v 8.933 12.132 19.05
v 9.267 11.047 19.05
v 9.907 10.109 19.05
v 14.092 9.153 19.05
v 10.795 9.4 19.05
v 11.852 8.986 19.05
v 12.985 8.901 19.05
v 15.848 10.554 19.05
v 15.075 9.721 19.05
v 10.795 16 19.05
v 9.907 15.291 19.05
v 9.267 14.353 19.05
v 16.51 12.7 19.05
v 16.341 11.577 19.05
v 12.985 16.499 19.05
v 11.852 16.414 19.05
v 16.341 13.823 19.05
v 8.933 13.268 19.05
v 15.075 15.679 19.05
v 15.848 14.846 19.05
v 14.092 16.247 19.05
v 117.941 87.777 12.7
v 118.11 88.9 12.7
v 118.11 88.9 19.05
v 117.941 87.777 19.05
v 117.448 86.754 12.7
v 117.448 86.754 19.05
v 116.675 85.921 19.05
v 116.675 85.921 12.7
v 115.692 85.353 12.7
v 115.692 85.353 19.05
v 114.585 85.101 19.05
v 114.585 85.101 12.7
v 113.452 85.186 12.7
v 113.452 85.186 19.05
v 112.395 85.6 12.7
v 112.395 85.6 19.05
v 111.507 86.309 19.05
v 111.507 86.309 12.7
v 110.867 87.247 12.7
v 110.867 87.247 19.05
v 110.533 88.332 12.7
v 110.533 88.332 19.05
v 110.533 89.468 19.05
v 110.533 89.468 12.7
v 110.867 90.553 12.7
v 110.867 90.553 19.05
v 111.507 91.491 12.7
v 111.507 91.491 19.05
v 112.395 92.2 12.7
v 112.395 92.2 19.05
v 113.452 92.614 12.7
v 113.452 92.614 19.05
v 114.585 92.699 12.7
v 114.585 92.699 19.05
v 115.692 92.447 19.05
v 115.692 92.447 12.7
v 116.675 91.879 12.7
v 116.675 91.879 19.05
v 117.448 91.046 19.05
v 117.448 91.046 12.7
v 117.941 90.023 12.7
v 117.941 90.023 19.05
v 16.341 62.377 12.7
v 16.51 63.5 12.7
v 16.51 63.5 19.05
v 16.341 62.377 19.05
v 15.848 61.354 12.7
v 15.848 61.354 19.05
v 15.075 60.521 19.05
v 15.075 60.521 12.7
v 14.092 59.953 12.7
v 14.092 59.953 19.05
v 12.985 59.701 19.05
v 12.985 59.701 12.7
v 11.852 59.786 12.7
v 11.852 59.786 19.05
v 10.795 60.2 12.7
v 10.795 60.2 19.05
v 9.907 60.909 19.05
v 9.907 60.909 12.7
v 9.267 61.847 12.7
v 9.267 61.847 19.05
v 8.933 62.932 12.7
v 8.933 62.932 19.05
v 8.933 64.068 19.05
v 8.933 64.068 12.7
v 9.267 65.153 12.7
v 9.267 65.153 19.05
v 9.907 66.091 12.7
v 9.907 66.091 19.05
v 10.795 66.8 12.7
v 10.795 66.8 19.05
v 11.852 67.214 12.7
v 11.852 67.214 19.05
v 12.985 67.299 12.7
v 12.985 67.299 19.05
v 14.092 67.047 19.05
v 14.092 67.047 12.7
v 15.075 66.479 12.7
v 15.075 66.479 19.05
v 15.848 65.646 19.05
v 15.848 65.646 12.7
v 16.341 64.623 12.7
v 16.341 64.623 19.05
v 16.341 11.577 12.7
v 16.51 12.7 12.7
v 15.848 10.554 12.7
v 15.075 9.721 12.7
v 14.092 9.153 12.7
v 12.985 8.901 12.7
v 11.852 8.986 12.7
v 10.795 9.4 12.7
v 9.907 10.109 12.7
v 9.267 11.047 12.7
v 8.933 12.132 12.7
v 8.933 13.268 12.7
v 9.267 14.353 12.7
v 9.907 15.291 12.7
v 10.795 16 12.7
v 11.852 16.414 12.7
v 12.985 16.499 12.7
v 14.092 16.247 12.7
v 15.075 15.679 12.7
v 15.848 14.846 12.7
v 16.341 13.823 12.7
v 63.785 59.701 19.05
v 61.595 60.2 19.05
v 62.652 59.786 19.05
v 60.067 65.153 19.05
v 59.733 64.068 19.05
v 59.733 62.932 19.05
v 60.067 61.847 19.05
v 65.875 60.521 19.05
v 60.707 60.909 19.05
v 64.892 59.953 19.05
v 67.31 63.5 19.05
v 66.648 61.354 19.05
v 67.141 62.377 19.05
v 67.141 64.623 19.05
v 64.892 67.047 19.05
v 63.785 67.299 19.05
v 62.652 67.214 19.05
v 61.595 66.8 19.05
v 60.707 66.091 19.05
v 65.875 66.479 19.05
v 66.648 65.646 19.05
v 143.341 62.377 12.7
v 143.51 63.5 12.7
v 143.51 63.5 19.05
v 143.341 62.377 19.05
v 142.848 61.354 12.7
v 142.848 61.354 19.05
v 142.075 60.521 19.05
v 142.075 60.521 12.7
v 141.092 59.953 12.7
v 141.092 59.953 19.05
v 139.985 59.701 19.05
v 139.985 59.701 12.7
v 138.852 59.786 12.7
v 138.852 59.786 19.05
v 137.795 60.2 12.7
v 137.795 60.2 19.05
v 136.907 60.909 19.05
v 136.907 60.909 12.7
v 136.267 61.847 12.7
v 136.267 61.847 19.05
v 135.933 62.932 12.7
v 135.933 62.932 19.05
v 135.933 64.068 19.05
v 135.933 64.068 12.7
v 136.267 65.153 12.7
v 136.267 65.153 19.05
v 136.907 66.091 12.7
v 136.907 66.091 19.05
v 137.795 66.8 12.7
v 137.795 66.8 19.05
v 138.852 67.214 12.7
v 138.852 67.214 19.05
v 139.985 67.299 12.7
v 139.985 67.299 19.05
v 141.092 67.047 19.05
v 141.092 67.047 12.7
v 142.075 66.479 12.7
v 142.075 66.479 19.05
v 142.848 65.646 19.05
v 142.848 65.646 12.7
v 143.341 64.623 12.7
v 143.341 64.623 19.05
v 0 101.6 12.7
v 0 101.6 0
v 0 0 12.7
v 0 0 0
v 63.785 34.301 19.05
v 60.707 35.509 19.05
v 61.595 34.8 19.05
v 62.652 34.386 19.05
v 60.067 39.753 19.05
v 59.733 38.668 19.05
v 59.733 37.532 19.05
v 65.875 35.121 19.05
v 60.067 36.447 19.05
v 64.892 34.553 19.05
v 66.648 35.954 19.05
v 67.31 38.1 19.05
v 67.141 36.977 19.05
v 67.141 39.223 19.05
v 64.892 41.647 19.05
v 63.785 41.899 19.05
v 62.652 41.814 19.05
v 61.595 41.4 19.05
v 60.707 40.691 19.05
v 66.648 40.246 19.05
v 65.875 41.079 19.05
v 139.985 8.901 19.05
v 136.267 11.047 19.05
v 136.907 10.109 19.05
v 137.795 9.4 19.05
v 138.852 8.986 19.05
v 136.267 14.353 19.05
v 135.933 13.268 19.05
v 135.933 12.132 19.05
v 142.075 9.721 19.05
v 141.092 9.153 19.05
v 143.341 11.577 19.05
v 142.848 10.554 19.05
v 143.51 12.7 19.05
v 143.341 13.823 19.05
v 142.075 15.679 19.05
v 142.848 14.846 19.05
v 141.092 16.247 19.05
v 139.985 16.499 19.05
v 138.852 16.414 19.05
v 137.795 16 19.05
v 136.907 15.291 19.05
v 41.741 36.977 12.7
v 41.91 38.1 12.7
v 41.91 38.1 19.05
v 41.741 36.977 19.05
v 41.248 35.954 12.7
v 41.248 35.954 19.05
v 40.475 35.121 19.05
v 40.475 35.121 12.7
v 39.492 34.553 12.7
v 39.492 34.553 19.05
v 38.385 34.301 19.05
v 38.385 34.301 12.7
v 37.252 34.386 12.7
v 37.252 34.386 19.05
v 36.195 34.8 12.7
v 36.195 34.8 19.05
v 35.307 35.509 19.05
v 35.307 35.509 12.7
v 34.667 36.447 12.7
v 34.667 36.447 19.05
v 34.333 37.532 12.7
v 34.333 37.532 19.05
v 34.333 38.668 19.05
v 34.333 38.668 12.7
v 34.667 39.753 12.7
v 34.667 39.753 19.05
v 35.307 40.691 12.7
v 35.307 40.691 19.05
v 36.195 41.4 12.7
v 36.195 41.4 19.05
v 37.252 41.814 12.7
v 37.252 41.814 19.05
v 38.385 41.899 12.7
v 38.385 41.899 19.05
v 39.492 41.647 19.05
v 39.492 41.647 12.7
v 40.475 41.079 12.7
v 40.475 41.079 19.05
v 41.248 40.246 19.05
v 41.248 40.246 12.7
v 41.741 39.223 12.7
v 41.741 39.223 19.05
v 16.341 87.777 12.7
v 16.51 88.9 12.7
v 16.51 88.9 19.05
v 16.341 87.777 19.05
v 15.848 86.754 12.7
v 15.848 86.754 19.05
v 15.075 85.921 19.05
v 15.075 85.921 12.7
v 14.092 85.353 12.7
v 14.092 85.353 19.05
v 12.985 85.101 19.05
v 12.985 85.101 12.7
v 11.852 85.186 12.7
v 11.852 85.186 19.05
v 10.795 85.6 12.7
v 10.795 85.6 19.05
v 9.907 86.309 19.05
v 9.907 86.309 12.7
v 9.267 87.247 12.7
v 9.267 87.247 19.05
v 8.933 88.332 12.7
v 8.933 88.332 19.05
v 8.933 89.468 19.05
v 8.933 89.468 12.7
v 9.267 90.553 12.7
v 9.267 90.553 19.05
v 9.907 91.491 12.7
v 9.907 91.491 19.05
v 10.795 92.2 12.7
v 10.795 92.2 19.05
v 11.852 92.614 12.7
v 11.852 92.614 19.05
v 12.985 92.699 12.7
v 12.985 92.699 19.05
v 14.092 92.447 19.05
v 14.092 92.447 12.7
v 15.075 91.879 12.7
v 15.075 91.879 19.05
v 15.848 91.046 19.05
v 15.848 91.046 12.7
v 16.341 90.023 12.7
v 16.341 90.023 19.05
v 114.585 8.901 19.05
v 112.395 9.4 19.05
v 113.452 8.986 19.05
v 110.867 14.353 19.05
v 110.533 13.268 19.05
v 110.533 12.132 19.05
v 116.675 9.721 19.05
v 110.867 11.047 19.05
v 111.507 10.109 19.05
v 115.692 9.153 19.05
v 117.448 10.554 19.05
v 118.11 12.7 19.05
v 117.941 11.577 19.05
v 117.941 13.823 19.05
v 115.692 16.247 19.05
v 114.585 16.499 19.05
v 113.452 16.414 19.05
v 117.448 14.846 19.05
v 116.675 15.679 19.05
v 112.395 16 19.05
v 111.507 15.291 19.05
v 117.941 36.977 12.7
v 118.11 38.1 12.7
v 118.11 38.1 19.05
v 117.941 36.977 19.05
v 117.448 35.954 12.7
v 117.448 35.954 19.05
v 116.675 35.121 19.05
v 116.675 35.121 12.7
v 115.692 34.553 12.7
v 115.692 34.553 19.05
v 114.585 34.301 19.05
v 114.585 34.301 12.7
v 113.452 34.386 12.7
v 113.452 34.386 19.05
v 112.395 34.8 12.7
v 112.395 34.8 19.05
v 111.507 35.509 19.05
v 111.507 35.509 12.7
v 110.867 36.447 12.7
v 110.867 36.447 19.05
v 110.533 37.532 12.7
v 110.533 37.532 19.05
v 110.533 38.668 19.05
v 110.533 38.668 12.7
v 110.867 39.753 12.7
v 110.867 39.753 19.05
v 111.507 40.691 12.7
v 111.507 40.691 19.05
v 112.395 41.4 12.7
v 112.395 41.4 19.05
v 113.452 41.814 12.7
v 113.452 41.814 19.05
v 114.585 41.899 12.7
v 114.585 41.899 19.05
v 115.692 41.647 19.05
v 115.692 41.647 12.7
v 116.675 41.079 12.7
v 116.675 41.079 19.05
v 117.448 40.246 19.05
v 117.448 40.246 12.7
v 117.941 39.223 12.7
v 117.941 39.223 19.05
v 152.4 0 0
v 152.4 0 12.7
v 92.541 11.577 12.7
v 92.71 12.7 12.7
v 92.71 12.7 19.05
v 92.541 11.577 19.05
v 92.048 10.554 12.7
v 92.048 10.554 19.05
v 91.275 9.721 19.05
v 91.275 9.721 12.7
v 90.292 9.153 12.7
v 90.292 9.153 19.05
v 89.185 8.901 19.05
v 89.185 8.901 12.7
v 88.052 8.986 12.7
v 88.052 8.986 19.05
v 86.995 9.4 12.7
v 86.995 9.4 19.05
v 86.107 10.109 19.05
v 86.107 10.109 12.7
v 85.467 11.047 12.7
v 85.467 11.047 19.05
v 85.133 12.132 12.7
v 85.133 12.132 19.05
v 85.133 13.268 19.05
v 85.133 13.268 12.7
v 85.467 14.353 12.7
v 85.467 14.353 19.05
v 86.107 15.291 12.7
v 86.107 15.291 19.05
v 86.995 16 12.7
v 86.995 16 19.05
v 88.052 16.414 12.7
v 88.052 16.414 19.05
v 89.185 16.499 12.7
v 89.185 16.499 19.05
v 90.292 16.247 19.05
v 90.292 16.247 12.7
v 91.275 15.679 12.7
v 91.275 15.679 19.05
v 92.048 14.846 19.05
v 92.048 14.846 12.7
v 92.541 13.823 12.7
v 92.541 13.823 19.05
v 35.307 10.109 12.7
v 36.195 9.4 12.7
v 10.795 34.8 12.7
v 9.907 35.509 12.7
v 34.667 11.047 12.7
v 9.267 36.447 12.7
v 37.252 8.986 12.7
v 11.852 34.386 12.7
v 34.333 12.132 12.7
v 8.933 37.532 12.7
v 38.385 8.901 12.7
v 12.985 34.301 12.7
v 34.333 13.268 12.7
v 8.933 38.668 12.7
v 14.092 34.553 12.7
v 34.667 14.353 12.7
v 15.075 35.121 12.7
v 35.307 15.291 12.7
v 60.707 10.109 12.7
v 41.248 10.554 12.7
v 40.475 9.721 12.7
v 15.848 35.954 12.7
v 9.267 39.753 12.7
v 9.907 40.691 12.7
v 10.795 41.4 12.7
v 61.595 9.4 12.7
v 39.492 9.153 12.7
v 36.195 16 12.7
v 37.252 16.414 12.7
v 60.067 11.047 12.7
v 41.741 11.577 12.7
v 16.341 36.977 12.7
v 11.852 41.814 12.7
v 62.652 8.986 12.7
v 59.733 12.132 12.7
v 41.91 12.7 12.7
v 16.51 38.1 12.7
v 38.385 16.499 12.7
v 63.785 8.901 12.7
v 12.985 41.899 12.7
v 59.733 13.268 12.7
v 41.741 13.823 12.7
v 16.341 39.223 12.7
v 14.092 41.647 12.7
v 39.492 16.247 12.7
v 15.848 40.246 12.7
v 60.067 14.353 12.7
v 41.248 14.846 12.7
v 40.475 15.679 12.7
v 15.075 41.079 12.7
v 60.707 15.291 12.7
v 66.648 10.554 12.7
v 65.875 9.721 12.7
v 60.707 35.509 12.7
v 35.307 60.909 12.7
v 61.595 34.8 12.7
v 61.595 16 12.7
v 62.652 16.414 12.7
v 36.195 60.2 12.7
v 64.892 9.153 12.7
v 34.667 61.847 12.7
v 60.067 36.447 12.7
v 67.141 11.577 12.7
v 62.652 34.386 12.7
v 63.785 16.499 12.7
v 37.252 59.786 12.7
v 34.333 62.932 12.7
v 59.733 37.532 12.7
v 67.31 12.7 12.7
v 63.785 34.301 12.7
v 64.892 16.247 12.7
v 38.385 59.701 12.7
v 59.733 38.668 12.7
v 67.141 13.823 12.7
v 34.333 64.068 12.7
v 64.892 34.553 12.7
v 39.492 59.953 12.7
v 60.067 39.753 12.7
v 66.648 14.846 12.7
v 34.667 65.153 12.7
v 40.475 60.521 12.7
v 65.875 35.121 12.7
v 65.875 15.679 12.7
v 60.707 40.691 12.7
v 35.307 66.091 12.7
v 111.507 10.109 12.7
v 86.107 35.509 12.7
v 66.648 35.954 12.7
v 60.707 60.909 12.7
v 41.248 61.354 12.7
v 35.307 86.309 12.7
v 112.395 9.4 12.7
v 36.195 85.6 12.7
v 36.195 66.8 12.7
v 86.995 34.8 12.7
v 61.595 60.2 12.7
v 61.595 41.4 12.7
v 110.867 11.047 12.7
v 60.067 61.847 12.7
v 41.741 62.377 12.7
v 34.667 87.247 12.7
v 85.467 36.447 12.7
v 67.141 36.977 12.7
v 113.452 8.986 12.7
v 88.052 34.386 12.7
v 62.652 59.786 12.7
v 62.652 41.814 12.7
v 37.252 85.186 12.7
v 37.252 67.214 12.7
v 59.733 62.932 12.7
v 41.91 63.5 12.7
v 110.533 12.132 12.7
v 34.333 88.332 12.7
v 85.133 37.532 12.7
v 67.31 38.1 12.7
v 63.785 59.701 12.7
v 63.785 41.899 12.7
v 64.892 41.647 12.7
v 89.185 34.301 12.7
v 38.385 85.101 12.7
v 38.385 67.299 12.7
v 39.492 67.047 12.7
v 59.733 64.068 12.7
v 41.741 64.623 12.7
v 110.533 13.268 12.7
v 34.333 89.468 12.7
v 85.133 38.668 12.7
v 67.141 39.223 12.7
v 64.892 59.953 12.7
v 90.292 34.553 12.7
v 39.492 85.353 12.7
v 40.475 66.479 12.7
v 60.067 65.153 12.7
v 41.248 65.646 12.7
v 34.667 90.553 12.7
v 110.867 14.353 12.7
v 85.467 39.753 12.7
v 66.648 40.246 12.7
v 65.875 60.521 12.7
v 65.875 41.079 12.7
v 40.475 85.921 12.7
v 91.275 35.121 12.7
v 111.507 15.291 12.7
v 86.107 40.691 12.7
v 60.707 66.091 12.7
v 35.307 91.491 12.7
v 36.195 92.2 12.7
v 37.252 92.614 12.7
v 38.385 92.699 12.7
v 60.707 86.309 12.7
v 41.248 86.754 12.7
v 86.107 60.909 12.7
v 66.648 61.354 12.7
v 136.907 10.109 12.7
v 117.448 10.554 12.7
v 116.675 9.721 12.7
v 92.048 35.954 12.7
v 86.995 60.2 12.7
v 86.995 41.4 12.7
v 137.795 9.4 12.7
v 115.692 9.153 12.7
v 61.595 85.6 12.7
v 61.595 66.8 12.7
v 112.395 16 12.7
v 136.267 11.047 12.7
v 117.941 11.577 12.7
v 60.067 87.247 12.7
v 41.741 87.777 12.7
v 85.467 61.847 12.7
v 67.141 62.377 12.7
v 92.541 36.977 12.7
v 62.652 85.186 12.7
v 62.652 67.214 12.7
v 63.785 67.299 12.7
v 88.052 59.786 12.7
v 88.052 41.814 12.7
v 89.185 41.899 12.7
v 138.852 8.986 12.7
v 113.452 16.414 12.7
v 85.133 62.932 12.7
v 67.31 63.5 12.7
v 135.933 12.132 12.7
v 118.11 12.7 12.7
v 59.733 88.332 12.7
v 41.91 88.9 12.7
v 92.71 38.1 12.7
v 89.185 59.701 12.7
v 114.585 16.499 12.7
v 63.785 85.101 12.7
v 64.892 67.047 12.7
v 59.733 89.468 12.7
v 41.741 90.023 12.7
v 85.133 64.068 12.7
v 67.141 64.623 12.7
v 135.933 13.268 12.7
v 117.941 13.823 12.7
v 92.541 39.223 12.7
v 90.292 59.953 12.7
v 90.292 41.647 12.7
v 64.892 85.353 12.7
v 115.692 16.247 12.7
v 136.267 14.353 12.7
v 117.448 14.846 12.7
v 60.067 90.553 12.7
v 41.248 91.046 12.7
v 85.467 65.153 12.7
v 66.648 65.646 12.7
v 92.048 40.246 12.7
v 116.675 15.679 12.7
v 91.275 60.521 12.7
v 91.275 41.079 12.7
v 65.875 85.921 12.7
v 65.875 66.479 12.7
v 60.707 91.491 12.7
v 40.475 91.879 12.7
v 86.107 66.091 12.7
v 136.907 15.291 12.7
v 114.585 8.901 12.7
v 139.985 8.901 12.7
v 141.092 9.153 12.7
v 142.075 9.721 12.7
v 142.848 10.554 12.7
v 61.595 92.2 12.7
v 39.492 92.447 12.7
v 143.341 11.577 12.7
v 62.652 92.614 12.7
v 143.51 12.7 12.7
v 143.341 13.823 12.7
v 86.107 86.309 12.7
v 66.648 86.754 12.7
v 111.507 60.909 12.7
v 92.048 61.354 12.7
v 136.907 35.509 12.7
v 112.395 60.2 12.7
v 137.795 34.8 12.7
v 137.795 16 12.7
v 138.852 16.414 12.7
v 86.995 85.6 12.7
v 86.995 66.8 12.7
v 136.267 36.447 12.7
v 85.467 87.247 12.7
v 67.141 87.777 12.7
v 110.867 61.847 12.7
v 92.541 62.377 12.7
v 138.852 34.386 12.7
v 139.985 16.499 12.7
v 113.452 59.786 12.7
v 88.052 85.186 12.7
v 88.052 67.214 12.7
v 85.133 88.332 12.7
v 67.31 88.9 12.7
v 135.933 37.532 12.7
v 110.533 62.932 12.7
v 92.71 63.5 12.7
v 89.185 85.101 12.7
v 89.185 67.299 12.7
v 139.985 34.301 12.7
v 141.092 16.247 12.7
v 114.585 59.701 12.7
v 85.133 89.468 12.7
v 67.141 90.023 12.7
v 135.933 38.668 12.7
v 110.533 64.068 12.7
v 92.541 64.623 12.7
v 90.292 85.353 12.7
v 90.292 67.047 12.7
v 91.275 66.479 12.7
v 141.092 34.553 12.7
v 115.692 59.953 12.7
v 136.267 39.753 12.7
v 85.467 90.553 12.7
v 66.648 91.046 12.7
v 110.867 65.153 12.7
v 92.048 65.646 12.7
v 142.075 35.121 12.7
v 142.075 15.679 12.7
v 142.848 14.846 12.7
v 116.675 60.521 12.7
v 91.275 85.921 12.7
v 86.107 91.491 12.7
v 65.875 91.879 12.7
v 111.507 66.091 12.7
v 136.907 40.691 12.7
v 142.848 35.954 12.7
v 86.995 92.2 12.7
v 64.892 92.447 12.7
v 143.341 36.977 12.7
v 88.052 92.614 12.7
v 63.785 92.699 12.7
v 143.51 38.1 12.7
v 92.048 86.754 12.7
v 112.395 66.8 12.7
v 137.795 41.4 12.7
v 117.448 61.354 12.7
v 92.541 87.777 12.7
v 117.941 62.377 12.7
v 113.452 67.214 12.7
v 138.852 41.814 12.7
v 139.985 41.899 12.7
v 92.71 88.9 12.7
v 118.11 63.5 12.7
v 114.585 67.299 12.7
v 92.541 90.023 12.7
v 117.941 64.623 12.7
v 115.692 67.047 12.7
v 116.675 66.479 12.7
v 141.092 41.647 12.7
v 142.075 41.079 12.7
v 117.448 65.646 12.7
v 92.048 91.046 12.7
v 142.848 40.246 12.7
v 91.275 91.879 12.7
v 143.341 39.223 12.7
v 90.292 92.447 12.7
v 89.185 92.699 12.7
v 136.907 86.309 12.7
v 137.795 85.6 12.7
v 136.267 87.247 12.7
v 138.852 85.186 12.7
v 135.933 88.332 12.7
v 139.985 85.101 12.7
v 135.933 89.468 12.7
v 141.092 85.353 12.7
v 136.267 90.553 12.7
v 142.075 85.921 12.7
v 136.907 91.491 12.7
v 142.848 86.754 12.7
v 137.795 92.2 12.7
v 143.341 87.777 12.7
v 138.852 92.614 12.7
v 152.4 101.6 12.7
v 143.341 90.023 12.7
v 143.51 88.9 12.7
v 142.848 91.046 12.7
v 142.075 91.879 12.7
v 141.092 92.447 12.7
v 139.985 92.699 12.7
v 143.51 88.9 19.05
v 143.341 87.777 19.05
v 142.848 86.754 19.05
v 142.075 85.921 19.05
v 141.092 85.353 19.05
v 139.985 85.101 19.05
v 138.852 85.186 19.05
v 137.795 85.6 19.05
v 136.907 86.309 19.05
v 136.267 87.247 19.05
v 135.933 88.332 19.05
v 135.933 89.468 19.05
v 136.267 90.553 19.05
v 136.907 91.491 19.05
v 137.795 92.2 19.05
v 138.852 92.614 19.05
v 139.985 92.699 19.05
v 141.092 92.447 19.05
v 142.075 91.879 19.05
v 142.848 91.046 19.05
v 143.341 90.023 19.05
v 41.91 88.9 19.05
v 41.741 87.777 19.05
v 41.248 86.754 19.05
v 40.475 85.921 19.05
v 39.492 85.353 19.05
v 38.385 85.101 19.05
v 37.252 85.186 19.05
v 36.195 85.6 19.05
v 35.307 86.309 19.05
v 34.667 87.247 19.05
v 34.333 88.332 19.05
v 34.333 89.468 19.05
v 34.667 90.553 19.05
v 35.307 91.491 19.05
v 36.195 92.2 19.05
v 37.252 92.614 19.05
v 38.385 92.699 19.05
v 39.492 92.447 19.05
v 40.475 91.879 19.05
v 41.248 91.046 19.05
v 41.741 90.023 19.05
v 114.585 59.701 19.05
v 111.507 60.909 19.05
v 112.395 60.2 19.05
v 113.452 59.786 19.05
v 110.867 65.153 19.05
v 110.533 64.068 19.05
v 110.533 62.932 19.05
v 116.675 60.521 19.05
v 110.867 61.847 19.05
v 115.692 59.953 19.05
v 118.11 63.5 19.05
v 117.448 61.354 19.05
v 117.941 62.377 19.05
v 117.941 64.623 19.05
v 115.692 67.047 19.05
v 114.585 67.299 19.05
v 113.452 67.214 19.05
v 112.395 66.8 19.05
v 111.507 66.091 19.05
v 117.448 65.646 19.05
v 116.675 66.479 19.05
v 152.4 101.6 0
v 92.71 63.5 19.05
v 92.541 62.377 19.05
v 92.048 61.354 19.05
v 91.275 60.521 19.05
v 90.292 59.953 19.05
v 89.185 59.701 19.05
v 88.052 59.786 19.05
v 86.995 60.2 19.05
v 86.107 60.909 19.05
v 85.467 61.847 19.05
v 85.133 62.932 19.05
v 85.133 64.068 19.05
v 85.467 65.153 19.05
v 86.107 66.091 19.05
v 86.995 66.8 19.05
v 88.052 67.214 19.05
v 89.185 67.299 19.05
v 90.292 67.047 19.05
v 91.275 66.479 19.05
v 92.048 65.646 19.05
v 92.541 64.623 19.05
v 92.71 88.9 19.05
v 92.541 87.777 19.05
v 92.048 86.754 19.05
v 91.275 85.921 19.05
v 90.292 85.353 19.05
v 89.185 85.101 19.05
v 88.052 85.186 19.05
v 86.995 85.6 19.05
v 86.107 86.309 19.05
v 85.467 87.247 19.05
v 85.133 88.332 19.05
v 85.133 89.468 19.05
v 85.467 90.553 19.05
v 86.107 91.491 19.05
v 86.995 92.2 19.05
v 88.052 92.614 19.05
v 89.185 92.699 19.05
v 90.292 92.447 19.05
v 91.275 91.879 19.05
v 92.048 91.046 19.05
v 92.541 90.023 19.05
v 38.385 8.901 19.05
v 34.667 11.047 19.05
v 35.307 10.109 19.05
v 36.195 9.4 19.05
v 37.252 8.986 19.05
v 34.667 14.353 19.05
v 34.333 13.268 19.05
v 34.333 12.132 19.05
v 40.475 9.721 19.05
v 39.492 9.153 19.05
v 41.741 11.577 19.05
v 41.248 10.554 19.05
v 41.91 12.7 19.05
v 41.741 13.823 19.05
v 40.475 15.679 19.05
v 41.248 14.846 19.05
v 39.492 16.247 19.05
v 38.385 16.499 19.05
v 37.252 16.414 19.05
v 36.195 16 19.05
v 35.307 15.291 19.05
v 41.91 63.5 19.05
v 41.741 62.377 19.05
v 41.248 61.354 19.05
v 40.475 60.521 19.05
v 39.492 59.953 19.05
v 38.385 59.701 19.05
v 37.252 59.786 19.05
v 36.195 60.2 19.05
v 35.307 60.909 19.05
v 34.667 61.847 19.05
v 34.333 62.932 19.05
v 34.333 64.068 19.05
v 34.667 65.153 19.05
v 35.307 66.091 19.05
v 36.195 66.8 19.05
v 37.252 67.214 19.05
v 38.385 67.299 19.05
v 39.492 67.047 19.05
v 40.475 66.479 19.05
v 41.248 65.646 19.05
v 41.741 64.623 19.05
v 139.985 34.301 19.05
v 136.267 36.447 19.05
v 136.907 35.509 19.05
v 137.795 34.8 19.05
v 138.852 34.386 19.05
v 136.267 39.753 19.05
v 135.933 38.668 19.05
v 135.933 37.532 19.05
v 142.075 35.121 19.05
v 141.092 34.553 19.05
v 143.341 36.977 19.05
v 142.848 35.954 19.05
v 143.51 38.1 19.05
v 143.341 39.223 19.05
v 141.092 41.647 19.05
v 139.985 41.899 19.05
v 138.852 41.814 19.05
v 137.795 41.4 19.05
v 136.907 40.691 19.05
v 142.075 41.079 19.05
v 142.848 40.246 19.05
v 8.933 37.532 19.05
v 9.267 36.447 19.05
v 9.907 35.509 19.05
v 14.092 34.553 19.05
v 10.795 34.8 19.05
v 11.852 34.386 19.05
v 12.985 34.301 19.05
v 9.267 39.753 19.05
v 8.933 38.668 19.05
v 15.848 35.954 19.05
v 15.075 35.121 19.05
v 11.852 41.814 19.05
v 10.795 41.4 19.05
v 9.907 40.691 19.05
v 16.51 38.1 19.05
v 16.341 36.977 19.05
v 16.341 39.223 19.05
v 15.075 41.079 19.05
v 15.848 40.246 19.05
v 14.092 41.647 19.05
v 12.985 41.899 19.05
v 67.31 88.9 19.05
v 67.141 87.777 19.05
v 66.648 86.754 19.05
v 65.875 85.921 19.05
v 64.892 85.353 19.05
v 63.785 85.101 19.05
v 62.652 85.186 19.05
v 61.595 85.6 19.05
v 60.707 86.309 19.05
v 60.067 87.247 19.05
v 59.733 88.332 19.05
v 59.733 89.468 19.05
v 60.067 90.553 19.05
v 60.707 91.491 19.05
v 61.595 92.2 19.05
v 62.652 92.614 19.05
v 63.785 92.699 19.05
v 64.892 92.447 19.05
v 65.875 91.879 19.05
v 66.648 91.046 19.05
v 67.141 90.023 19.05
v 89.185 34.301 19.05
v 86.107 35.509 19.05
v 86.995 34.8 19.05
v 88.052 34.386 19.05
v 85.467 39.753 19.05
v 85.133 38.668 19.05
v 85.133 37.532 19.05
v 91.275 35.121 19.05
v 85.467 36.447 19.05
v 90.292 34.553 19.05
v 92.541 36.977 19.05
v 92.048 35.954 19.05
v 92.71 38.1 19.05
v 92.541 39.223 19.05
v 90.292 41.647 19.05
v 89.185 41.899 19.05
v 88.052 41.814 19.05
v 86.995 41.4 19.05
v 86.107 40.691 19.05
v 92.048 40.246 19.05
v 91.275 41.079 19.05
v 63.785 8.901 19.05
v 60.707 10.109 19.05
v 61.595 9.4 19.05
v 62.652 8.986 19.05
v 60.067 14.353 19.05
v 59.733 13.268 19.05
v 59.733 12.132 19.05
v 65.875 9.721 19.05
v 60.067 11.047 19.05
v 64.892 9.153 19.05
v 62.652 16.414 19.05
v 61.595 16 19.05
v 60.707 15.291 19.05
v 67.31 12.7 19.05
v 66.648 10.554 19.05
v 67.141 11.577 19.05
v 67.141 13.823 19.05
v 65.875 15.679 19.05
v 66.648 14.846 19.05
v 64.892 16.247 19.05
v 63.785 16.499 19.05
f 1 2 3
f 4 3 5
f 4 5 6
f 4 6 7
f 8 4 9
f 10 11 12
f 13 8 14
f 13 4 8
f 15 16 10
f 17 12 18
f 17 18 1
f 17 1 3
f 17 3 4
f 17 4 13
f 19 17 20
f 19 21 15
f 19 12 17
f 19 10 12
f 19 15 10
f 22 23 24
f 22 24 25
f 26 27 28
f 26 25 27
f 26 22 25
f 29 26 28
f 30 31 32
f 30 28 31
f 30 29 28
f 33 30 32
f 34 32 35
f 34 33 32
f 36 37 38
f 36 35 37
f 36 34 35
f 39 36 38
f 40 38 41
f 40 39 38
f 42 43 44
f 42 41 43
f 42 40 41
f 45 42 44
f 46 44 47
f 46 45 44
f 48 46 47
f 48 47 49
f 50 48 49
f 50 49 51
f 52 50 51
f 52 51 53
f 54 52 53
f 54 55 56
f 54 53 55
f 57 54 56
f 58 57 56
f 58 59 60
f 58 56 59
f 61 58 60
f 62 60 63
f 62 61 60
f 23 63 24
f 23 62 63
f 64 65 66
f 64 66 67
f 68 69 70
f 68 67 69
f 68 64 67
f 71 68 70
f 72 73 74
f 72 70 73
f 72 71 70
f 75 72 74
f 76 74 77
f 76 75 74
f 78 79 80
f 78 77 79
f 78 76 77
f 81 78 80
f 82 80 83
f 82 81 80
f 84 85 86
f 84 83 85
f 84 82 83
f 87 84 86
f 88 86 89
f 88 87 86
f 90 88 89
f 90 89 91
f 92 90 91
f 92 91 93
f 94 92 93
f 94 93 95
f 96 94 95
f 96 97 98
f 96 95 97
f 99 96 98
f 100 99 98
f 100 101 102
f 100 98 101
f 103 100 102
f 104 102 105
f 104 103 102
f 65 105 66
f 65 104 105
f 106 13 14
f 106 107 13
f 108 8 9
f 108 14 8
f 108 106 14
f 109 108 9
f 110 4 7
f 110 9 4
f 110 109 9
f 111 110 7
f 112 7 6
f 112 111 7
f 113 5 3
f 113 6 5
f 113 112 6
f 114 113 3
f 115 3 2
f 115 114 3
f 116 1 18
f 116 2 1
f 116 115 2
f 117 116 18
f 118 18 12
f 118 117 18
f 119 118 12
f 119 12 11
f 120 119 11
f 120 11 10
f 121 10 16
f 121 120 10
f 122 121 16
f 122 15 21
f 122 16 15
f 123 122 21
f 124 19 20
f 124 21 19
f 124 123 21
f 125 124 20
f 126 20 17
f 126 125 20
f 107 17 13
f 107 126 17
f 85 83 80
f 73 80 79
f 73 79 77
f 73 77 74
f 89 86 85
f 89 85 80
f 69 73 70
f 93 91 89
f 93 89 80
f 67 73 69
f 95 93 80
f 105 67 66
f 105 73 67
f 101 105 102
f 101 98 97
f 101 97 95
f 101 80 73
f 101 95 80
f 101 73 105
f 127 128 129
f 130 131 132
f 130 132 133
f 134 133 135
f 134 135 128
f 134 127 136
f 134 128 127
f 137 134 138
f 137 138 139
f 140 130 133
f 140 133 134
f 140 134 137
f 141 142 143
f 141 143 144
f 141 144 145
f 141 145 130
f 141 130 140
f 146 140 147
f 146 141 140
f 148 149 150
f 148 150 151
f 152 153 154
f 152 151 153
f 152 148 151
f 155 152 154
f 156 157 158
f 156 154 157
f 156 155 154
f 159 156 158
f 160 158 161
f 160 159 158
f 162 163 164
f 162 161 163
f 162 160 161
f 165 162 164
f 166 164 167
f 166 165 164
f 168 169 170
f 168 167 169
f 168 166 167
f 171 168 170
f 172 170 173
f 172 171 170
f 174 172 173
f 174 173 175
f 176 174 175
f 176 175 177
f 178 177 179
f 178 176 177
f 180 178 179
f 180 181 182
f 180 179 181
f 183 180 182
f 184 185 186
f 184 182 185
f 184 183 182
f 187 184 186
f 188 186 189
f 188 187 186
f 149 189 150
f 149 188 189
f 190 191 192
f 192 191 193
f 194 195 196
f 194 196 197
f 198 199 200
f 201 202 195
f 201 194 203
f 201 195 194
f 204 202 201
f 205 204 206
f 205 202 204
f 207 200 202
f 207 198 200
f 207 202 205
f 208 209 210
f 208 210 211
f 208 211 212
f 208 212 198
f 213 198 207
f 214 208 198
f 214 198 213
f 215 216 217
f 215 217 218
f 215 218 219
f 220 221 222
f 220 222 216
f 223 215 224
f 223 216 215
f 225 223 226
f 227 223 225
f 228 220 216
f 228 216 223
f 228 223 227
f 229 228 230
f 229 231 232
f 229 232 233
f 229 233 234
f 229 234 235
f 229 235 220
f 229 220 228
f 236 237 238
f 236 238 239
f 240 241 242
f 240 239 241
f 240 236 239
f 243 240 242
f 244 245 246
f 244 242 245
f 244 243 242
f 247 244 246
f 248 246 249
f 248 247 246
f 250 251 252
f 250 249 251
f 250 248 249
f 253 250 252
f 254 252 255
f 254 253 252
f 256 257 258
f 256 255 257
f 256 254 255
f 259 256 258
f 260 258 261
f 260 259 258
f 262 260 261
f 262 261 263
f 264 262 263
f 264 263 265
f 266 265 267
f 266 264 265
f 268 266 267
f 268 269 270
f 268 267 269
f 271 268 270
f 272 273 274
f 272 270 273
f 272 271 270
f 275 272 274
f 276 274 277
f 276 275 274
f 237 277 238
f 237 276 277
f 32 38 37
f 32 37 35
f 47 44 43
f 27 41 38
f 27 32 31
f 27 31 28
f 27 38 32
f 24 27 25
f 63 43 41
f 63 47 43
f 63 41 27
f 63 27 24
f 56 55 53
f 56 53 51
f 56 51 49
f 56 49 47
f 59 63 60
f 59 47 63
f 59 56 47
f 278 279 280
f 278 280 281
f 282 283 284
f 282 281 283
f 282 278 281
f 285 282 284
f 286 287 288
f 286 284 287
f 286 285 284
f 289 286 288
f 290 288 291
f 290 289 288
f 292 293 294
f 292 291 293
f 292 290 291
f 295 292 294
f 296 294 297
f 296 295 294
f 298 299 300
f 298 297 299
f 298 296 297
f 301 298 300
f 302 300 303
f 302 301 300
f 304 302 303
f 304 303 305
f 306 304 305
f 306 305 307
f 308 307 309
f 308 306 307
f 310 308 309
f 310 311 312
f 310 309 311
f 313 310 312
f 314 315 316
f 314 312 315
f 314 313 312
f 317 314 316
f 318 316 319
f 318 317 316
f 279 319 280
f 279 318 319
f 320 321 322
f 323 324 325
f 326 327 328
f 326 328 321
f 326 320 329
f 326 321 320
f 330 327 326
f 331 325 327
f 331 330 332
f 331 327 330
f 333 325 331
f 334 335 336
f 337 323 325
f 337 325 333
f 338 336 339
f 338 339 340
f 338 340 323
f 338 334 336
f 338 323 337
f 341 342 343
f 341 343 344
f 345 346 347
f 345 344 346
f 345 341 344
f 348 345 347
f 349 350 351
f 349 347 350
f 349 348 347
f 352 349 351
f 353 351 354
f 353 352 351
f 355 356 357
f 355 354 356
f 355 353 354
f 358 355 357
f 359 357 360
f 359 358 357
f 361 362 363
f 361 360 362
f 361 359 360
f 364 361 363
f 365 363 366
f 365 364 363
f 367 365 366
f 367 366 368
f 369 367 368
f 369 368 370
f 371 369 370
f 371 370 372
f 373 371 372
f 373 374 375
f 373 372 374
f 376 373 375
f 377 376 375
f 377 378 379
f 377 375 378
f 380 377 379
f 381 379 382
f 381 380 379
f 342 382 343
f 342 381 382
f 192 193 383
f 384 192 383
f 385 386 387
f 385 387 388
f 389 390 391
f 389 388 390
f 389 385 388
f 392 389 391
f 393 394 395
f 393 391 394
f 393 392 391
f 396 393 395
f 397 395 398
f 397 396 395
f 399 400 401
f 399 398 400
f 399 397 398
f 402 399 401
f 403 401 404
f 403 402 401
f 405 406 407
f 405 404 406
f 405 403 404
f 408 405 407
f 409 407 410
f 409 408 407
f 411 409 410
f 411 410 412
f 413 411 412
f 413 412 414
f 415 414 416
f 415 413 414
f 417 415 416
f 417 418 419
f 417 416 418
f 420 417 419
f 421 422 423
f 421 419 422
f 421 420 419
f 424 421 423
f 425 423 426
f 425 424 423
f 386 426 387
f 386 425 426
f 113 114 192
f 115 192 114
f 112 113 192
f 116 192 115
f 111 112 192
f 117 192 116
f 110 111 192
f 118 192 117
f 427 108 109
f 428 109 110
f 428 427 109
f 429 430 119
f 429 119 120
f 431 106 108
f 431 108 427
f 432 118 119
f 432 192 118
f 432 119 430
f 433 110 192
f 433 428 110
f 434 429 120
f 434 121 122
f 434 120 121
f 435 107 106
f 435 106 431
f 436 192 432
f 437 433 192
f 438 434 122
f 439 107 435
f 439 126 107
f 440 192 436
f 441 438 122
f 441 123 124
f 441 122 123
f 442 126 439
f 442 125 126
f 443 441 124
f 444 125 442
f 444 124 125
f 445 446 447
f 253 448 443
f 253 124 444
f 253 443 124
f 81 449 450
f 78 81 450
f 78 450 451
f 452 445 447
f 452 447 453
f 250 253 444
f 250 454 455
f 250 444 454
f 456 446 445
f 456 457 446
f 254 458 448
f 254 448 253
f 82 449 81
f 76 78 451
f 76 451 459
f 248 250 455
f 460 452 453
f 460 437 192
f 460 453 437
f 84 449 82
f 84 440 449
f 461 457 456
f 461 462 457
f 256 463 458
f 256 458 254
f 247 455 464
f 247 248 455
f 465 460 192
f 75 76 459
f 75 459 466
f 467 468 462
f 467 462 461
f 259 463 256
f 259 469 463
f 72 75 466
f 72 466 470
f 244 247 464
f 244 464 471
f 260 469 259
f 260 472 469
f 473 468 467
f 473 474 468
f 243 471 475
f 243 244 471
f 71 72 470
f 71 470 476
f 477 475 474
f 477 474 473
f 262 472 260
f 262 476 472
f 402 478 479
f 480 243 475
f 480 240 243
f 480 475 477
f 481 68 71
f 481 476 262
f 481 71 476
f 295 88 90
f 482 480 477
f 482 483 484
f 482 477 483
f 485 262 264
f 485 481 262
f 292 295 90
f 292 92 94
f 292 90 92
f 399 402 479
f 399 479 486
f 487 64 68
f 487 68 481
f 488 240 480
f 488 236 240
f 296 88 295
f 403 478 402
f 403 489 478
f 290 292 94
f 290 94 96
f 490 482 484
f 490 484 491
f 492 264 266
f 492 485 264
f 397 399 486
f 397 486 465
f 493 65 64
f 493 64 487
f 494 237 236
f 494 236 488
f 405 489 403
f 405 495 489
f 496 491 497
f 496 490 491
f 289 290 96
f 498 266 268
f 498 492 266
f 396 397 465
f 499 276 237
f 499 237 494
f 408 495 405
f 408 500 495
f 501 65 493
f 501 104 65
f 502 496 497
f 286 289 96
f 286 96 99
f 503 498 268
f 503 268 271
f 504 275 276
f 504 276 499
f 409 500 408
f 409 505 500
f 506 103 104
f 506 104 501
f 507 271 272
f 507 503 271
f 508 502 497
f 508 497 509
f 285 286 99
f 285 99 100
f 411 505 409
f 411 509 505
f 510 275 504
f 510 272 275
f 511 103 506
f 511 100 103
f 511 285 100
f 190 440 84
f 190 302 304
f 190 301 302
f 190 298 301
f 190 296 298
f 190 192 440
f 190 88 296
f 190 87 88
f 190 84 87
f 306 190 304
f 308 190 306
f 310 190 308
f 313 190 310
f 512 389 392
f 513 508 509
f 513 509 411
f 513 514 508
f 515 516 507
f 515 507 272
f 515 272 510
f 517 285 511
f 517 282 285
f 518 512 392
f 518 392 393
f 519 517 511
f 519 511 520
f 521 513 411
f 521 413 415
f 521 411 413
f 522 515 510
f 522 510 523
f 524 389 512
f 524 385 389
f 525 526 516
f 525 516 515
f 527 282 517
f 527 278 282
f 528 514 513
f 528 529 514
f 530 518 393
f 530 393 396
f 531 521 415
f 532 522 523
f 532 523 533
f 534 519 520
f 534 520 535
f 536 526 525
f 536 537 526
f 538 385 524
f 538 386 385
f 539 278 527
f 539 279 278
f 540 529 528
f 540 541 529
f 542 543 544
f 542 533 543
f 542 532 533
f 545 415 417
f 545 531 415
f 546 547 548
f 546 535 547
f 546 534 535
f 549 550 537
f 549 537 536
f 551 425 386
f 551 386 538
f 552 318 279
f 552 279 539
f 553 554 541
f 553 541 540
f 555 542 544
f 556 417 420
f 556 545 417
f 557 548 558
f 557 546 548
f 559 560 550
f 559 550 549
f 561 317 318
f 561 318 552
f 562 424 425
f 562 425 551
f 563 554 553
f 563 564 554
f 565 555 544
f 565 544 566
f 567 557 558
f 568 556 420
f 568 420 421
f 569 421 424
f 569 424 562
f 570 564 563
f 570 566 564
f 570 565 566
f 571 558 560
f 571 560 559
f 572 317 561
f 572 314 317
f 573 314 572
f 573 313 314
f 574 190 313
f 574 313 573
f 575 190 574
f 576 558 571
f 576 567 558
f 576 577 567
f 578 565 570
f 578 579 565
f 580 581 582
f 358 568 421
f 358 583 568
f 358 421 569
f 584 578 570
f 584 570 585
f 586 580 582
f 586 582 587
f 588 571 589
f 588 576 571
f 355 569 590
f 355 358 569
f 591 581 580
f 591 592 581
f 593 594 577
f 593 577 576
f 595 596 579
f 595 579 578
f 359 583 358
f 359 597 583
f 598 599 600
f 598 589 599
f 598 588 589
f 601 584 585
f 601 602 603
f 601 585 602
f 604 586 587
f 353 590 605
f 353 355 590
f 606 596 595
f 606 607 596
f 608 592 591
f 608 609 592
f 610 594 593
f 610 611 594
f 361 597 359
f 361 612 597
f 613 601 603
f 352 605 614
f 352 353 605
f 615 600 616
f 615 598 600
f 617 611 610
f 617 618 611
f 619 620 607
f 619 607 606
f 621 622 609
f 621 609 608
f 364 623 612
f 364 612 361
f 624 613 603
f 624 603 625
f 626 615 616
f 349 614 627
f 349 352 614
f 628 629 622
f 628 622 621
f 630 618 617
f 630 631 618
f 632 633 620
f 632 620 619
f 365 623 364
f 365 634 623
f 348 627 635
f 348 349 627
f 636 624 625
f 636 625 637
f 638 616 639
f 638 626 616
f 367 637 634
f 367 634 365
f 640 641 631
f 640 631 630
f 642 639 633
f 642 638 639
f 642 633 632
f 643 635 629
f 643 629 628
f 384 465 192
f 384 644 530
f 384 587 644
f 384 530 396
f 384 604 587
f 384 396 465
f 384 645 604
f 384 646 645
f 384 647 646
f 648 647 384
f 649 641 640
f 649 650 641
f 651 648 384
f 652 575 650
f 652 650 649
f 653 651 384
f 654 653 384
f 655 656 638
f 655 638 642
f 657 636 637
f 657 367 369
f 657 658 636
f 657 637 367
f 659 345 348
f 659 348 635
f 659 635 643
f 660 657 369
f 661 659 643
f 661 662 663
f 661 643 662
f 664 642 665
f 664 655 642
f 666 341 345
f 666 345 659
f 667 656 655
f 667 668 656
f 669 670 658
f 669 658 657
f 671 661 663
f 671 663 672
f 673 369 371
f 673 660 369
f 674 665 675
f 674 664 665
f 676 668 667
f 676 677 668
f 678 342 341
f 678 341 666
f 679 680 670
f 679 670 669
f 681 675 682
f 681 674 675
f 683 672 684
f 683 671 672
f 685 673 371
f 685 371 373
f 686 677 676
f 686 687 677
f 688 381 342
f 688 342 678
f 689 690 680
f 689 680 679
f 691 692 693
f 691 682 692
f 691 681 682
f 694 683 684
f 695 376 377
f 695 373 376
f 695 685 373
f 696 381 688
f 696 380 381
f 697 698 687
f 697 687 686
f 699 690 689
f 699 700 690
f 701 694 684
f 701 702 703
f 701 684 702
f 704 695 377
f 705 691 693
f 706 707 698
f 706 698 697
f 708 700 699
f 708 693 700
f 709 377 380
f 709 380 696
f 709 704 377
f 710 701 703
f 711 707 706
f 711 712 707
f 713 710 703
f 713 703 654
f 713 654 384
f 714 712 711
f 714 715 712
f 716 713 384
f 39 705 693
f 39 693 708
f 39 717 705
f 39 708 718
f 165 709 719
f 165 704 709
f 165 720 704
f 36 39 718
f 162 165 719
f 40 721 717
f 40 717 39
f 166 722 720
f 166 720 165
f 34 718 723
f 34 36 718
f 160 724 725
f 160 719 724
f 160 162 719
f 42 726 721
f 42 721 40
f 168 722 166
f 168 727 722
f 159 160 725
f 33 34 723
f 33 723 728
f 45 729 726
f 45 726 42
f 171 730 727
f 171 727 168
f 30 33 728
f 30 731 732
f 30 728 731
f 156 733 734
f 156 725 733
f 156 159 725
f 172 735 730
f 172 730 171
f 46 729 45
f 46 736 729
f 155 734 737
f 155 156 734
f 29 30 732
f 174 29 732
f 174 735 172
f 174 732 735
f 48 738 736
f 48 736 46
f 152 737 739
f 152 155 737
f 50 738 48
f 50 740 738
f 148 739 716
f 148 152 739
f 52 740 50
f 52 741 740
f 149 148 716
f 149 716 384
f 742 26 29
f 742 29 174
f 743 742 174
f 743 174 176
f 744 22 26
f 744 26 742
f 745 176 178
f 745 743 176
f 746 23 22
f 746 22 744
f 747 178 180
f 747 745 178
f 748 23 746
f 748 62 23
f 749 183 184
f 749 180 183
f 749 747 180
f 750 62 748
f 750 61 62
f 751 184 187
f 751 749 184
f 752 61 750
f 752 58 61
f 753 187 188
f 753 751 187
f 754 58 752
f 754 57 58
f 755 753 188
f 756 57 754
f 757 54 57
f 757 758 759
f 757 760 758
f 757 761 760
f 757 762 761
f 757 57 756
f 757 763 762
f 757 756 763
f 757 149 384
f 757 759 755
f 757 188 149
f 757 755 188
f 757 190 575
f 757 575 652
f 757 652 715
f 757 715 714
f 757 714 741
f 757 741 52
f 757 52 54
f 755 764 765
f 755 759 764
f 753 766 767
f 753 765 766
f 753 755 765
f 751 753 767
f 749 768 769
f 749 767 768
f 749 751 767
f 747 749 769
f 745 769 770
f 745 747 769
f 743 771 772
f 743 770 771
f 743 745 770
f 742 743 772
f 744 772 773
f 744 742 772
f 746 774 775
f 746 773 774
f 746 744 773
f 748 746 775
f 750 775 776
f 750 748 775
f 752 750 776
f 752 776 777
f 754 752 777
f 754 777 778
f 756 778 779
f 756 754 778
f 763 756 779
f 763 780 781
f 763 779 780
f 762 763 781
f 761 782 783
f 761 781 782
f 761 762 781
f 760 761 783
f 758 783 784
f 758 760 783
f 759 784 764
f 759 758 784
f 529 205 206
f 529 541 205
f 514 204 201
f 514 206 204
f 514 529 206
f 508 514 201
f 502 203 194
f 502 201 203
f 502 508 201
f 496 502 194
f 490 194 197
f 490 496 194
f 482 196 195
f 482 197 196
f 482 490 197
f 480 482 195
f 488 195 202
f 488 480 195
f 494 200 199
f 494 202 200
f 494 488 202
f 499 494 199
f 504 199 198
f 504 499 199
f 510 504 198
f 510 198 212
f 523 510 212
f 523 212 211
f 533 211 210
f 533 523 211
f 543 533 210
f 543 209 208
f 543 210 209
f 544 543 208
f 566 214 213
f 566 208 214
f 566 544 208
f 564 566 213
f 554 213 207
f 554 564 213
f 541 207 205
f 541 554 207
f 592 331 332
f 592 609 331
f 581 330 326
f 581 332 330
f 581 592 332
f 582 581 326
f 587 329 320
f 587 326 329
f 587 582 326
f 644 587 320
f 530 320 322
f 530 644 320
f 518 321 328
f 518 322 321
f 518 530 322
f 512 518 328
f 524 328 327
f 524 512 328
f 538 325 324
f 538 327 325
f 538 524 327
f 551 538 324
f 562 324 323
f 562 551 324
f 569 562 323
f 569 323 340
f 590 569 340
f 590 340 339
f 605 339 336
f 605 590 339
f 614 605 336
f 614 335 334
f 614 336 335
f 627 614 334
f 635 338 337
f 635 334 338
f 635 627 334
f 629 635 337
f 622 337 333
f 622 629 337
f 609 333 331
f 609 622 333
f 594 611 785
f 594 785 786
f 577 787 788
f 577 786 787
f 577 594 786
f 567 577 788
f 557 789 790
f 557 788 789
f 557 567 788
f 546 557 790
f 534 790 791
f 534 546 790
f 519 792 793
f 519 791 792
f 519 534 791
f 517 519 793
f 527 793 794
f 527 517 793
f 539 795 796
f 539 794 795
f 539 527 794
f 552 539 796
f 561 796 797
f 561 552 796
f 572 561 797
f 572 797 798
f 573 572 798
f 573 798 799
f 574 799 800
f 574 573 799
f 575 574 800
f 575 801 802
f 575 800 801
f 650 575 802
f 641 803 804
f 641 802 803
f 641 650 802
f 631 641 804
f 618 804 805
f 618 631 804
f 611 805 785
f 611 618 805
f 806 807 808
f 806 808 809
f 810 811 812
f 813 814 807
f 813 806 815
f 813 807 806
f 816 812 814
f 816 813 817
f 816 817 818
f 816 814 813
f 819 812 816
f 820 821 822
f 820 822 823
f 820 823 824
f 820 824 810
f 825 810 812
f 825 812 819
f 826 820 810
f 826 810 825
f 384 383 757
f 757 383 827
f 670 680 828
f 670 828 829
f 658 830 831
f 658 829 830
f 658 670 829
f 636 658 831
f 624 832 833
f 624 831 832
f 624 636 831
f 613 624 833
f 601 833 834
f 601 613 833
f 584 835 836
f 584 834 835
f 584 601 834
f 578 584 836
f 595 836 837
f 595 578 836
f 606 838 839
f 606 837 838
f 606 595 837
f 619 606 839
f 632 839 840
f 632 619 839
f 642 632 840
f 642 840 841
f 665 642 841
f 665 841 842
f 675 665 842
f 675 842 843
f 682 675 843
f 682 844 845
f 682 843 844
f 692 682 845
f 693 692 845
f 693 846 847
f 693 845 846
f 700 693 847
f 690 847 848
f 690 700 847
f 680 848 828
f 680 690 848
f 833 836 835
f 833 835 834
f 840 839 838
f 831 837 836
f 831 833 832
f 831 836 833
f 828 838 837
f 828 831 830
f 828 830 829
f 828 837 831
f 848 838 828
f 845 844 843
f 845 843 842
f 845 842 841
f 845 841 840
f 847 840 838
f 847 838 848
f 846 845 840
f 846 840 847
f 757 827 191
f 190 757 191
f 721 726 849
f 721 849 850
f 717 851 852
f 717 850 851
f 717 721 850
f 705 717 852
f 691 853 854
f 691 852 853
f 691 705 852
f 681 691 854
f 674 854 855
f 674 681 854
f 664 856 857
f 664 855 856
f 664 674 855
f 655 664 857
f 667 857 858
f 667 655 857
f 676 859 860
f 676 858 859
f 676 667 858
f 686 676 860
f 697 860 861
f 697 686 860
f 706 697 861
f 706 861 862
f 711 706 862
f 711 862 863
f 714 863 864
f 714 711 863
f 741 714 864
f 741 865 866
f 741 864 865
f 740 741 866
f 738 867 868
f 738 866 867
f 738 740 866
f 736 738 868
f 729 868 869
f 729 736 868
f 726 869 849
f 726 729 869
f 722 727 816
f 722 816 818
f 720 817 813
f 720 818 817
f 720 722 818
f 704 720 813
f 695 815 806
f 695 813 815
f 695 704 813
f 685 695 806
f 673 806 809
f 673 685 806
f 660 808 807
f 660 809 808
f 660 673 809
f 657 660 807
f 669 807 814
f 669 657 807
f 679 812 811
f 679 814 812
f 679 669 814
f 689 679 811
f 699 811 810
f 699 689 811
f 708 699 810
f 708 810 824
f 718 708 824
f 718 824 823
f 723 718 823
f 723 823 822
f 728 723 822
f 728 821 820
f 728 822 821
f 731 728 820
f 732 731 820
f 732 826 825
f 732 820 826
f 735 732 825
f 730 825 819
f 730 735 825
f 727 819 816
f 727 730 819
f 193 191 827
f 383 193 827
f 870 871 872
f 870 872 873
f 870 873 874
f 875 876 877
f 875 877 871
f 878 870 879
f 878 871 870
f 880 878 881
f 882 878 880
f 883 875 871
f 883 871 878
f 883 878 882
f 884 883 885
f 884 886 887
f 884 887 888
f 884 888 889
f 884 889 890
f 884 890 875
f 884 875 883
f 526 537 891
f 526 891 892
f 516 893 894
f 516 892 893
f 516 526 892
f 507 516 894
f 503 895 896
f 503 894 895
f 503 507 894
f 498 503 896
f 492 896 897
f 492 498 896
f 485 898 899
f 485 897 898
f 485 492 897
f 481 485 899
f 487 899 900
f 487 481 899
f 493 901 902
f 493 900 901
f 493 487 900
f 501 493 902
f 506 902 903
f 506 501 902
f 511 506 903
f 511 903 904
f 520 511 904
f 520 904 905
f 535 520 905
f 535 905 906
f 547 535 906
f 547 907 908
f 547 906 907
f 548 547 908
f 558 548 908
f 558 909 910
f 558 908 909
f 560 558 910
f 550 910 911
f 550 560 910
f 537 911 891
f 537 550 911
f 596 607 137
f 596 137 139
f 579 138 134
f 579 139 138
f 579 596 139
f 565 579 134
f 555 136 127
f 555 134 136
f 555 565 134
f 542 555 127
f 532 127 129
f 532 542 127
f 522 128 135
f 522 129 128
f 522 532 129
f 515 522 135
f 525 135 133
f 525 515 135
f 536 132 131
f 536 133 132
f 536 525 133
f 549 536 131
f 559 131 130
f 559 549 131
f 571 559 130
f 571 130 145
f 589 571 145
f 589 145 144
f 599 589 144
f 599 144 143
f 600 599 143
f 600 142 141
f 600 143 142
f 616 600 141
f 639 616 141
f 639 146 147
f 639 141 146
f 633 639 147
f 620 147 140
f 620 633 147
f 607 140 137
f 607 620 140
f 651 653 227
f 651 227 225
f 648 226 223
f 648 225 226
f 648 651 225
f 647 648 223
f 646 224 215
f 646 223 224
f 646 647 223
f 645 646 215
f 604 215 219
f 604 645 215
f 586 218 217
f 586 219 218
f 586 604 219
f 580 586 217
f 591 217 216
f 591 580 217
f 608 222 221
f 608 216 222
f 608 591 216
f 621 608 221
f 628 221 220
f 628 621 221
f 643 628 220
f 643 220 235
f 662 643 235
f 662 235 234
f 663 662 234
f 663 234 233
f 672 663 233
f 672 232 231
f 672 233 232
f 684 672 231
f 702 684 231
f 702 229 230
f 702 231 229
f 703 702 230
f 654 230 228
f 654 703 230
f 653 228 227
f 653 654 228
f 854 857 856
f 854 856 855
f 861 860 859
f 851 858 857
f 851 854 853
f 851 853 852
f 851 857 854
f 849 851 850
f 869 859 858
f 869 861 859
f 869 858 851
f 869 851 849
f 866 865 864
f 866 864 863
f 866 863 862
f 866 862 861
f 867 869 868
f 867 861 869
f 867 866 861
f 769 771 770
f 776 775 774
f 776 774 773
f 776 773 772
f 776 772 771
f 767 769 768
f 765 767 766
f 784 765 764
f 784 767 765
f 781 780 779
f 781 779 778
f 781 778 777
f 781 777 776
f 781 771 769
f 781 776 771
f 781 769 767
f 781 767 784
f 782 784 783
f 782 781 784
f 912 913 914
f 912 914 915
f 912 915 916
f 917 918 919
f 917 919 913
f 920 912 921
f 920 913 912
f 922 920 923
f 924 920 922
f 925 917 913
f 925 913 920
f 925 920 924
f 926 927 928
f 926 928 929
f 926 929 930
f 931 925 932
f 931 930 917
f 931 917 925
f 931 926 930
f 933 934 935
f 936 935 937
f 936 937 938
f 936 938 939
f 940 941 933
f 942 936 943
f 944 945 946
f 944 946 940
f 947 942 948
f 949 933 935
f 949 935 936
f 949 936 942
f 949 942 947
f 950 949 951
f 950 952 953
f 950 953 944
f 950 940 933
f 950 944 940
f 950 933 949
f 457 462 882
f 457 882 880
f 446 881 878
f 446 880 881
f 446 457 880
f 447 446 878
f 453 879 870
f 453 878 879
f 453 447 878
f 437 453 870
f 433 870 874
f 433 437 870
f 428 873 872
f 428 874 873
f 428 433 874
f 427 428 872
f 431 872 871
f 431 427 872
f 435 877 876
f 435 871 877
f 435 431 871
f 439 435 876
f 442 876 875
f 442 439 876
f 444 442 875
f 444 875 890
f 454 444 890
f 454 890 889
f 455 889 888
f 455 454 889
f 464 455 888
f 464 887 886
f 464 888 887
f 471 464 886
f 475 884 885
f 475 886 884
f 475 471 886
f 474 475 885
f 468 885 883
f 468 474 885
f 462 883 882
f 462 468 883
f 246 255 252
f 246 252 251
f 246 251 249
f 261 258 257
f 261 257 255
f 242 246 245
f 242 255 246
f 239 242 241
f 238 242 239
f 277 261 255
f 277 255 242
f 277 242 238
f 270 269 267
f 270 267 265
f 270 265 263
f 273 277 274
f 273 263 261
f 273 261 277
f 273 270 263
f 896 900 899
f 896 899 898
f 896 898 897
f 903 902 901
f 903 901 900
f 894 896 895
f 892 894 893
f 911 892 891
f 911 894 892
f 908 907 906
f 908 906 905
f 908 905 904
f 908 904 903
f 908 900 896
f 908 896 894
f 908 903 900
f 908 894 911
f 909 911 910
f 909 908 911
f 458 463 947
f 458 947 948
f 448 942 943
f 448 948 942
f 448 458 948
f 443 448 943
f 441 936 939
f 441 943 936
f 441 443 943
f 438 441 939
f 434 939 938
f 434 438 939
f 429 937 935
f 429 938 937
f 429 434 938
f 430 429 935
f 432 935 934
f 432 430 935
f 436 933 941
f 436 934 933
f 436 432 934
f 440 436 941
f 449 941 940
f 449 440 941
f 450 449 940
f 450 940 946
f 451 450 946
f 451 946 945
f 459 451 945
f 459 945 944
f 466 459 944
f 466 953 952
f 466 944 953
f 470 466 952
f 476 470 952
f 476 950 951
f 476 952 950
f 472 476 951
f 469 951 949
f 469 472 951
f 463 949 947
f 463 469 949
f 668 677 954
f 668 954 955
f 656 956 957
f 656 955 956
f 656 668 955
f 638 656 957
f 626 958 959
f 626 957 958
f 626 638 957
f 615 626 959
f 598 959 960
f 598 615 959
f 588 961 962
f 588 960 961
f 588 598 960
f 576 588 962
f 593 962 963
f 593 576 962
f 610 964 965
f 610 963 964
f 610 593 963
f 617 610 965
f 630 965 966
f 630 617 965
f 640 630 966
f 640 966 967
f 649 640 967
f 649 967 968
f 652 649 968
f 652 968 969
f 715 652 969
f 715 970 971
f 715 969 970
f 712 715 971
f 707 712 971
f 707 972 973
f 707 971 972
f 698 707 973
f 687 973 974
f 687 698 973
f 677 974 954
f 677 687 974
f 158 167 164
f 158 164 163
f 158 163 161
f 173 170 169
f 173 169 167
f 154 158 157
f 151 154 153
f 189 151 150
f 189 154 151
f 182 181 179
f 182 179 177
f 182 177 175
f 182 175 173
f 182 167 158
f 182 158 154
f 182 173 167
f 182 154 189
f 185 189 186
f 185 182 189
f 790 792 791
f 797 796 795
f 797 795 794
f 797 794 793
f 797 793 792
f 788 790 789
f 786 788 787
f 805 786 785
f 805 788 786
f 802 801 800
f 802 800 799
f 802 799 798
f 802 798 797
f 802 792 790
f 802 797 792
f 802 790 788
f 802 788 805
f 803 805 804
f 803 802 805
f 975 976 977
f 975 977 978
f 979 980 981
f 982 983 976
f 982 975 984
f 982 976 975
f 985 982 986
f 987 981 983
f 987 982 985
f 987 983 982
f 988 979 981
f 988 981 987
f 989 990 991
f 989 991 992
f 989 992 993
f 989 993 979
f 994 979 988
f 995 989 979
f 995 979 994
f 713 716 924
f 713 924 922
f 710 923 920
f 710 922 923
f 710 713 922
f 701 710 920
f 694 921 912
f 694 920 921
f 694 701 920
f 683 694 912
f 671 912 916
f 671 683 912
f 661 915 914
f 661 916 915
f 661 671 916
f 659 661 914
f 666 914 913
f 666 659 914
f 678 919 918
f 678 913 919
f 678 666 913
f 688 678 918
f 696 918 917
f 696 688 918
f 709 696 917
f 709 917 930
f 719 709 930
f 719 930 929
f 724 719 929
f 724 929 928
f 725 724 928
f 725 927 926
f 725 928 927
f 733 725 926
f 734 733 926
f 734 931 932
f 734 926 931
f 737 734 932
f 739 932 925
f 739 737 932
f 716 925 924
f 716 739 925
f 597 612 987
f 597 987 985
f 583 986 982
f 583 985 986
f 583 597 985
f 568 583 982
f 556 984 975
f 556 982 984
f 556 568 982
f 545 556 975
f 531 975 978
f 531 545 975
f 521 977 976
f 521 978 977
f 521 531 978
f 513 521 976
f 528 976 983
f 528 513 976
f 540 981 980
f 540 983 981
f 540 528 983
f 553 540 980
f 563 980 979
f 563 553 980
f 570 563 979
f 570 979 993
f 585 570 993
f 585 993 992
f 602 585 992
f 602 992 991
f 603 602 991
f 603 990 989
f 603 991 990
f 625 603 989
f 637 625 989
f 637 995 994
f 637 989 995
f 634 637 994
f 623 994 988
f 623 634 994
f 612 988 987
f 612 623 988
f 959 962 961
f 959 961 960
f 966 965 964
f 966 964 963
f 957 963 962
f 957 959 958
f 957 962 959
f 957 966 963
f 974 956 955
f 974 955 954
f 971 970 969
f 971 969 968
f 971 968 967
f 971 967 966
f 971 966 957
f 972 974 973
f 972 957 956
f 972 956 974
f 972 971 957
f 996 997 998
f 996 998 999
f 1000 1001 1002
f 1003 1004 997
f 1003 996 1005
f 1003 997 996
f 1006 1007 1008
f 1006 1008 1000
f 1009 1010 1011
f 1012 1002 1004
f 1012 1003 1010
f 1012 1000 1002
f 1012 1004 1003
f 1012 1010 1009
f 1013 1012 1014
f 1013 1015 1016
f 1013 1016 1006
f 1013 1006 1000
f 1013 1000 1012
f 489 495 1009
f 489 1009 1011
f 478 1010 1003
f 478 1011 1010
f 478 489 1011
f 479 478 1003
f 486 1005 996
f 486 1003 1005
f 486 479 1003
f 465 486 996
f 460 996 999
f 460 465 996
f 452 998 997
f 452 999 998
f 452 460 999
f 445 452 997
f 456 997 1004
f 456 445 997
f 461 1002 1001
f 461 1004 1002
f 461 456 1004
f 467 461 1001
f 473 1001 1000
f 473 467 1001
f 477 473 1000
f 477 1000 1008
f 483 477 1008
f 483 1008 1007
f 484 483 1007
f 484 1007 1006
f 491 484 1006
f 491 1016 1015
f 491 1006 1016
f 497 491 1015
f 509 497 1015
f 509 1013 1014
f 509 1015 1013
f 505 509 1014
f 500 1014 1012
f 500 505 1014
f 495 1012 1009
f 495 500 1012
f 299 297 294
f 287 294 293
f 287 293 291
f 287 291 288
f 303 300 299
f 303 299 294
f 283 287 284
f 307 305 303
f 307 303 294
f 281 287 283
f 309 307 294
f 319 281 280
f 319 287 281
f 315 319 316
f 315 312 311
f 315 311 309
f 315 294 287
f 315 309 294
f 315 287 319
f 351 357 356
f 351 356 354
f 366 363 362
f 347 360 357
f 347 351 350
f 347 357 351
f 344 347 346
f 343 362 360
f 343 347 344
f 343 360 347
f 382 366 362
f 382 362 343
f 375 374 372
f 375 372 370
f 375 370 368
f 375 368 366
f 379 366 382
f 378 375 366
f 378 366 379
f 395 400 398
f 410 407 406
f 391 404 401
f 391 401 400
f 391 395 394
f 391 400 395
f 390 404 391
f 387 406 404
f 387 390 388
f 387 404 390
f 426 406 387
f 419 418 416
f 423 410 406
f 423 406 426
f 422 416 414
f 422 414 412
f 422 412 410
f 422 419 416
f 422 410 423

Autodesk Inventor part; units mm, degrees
ref_plane "YZ Plane" through (0, 0, 0) normal (1, 0, 0) x (0, 1, 0)
ref_plane "XZ Plane" through (0, 0, 0) normal (0, 1, 0) x (-1, 0, 0)
ref_plane "XY Plane" through (0, 0, 0) normal (0, 0, 1) x (1, 0, 0)
sketch "Sketch1" plane through (0, 0, 0) normal (0, 0, 1) x (1, 0, 0)
  line L0 (0, 0) -> (152.4, 0)
  line L1 (152.4, 0) -> (152.4, 101.6)
  line L2 (152.4, 101.6) -> (0, 101.6)
  line L3 (0, 101.6) -> (0, 0)
  dimension "d0" = 152.4
  dimension "d1" = 101.6
extrude "Extrusion1" add sketch "Sketch1" along normal blind 12.7
sketch "Sketch2" plane through (0, 0, 12.7) normal (0, 0, 1) x (1, 0, 0)
  circle A0 centre (12.7, 12.7) radius 3.81
  line L0 (0, 101.6) -> (0, 0) projected
  line L1 (0, 0) -> (152.4, 0) projected
  dimension "d4" = 12.7
  dimension "d5" = 12.7
  dimension "d6" = 7.62
extrude "Extrusion2" add sketch "Sketch2" along normal blind 6.35
pattern_linear "Rectangular Pattern1" count 6 spacing 25.4 along (1, 0, 0) count 4 spacing 25.4 along (0, 1, 0) of "Extrusion2"
properties part number "Rectangle Pattern Practice"
